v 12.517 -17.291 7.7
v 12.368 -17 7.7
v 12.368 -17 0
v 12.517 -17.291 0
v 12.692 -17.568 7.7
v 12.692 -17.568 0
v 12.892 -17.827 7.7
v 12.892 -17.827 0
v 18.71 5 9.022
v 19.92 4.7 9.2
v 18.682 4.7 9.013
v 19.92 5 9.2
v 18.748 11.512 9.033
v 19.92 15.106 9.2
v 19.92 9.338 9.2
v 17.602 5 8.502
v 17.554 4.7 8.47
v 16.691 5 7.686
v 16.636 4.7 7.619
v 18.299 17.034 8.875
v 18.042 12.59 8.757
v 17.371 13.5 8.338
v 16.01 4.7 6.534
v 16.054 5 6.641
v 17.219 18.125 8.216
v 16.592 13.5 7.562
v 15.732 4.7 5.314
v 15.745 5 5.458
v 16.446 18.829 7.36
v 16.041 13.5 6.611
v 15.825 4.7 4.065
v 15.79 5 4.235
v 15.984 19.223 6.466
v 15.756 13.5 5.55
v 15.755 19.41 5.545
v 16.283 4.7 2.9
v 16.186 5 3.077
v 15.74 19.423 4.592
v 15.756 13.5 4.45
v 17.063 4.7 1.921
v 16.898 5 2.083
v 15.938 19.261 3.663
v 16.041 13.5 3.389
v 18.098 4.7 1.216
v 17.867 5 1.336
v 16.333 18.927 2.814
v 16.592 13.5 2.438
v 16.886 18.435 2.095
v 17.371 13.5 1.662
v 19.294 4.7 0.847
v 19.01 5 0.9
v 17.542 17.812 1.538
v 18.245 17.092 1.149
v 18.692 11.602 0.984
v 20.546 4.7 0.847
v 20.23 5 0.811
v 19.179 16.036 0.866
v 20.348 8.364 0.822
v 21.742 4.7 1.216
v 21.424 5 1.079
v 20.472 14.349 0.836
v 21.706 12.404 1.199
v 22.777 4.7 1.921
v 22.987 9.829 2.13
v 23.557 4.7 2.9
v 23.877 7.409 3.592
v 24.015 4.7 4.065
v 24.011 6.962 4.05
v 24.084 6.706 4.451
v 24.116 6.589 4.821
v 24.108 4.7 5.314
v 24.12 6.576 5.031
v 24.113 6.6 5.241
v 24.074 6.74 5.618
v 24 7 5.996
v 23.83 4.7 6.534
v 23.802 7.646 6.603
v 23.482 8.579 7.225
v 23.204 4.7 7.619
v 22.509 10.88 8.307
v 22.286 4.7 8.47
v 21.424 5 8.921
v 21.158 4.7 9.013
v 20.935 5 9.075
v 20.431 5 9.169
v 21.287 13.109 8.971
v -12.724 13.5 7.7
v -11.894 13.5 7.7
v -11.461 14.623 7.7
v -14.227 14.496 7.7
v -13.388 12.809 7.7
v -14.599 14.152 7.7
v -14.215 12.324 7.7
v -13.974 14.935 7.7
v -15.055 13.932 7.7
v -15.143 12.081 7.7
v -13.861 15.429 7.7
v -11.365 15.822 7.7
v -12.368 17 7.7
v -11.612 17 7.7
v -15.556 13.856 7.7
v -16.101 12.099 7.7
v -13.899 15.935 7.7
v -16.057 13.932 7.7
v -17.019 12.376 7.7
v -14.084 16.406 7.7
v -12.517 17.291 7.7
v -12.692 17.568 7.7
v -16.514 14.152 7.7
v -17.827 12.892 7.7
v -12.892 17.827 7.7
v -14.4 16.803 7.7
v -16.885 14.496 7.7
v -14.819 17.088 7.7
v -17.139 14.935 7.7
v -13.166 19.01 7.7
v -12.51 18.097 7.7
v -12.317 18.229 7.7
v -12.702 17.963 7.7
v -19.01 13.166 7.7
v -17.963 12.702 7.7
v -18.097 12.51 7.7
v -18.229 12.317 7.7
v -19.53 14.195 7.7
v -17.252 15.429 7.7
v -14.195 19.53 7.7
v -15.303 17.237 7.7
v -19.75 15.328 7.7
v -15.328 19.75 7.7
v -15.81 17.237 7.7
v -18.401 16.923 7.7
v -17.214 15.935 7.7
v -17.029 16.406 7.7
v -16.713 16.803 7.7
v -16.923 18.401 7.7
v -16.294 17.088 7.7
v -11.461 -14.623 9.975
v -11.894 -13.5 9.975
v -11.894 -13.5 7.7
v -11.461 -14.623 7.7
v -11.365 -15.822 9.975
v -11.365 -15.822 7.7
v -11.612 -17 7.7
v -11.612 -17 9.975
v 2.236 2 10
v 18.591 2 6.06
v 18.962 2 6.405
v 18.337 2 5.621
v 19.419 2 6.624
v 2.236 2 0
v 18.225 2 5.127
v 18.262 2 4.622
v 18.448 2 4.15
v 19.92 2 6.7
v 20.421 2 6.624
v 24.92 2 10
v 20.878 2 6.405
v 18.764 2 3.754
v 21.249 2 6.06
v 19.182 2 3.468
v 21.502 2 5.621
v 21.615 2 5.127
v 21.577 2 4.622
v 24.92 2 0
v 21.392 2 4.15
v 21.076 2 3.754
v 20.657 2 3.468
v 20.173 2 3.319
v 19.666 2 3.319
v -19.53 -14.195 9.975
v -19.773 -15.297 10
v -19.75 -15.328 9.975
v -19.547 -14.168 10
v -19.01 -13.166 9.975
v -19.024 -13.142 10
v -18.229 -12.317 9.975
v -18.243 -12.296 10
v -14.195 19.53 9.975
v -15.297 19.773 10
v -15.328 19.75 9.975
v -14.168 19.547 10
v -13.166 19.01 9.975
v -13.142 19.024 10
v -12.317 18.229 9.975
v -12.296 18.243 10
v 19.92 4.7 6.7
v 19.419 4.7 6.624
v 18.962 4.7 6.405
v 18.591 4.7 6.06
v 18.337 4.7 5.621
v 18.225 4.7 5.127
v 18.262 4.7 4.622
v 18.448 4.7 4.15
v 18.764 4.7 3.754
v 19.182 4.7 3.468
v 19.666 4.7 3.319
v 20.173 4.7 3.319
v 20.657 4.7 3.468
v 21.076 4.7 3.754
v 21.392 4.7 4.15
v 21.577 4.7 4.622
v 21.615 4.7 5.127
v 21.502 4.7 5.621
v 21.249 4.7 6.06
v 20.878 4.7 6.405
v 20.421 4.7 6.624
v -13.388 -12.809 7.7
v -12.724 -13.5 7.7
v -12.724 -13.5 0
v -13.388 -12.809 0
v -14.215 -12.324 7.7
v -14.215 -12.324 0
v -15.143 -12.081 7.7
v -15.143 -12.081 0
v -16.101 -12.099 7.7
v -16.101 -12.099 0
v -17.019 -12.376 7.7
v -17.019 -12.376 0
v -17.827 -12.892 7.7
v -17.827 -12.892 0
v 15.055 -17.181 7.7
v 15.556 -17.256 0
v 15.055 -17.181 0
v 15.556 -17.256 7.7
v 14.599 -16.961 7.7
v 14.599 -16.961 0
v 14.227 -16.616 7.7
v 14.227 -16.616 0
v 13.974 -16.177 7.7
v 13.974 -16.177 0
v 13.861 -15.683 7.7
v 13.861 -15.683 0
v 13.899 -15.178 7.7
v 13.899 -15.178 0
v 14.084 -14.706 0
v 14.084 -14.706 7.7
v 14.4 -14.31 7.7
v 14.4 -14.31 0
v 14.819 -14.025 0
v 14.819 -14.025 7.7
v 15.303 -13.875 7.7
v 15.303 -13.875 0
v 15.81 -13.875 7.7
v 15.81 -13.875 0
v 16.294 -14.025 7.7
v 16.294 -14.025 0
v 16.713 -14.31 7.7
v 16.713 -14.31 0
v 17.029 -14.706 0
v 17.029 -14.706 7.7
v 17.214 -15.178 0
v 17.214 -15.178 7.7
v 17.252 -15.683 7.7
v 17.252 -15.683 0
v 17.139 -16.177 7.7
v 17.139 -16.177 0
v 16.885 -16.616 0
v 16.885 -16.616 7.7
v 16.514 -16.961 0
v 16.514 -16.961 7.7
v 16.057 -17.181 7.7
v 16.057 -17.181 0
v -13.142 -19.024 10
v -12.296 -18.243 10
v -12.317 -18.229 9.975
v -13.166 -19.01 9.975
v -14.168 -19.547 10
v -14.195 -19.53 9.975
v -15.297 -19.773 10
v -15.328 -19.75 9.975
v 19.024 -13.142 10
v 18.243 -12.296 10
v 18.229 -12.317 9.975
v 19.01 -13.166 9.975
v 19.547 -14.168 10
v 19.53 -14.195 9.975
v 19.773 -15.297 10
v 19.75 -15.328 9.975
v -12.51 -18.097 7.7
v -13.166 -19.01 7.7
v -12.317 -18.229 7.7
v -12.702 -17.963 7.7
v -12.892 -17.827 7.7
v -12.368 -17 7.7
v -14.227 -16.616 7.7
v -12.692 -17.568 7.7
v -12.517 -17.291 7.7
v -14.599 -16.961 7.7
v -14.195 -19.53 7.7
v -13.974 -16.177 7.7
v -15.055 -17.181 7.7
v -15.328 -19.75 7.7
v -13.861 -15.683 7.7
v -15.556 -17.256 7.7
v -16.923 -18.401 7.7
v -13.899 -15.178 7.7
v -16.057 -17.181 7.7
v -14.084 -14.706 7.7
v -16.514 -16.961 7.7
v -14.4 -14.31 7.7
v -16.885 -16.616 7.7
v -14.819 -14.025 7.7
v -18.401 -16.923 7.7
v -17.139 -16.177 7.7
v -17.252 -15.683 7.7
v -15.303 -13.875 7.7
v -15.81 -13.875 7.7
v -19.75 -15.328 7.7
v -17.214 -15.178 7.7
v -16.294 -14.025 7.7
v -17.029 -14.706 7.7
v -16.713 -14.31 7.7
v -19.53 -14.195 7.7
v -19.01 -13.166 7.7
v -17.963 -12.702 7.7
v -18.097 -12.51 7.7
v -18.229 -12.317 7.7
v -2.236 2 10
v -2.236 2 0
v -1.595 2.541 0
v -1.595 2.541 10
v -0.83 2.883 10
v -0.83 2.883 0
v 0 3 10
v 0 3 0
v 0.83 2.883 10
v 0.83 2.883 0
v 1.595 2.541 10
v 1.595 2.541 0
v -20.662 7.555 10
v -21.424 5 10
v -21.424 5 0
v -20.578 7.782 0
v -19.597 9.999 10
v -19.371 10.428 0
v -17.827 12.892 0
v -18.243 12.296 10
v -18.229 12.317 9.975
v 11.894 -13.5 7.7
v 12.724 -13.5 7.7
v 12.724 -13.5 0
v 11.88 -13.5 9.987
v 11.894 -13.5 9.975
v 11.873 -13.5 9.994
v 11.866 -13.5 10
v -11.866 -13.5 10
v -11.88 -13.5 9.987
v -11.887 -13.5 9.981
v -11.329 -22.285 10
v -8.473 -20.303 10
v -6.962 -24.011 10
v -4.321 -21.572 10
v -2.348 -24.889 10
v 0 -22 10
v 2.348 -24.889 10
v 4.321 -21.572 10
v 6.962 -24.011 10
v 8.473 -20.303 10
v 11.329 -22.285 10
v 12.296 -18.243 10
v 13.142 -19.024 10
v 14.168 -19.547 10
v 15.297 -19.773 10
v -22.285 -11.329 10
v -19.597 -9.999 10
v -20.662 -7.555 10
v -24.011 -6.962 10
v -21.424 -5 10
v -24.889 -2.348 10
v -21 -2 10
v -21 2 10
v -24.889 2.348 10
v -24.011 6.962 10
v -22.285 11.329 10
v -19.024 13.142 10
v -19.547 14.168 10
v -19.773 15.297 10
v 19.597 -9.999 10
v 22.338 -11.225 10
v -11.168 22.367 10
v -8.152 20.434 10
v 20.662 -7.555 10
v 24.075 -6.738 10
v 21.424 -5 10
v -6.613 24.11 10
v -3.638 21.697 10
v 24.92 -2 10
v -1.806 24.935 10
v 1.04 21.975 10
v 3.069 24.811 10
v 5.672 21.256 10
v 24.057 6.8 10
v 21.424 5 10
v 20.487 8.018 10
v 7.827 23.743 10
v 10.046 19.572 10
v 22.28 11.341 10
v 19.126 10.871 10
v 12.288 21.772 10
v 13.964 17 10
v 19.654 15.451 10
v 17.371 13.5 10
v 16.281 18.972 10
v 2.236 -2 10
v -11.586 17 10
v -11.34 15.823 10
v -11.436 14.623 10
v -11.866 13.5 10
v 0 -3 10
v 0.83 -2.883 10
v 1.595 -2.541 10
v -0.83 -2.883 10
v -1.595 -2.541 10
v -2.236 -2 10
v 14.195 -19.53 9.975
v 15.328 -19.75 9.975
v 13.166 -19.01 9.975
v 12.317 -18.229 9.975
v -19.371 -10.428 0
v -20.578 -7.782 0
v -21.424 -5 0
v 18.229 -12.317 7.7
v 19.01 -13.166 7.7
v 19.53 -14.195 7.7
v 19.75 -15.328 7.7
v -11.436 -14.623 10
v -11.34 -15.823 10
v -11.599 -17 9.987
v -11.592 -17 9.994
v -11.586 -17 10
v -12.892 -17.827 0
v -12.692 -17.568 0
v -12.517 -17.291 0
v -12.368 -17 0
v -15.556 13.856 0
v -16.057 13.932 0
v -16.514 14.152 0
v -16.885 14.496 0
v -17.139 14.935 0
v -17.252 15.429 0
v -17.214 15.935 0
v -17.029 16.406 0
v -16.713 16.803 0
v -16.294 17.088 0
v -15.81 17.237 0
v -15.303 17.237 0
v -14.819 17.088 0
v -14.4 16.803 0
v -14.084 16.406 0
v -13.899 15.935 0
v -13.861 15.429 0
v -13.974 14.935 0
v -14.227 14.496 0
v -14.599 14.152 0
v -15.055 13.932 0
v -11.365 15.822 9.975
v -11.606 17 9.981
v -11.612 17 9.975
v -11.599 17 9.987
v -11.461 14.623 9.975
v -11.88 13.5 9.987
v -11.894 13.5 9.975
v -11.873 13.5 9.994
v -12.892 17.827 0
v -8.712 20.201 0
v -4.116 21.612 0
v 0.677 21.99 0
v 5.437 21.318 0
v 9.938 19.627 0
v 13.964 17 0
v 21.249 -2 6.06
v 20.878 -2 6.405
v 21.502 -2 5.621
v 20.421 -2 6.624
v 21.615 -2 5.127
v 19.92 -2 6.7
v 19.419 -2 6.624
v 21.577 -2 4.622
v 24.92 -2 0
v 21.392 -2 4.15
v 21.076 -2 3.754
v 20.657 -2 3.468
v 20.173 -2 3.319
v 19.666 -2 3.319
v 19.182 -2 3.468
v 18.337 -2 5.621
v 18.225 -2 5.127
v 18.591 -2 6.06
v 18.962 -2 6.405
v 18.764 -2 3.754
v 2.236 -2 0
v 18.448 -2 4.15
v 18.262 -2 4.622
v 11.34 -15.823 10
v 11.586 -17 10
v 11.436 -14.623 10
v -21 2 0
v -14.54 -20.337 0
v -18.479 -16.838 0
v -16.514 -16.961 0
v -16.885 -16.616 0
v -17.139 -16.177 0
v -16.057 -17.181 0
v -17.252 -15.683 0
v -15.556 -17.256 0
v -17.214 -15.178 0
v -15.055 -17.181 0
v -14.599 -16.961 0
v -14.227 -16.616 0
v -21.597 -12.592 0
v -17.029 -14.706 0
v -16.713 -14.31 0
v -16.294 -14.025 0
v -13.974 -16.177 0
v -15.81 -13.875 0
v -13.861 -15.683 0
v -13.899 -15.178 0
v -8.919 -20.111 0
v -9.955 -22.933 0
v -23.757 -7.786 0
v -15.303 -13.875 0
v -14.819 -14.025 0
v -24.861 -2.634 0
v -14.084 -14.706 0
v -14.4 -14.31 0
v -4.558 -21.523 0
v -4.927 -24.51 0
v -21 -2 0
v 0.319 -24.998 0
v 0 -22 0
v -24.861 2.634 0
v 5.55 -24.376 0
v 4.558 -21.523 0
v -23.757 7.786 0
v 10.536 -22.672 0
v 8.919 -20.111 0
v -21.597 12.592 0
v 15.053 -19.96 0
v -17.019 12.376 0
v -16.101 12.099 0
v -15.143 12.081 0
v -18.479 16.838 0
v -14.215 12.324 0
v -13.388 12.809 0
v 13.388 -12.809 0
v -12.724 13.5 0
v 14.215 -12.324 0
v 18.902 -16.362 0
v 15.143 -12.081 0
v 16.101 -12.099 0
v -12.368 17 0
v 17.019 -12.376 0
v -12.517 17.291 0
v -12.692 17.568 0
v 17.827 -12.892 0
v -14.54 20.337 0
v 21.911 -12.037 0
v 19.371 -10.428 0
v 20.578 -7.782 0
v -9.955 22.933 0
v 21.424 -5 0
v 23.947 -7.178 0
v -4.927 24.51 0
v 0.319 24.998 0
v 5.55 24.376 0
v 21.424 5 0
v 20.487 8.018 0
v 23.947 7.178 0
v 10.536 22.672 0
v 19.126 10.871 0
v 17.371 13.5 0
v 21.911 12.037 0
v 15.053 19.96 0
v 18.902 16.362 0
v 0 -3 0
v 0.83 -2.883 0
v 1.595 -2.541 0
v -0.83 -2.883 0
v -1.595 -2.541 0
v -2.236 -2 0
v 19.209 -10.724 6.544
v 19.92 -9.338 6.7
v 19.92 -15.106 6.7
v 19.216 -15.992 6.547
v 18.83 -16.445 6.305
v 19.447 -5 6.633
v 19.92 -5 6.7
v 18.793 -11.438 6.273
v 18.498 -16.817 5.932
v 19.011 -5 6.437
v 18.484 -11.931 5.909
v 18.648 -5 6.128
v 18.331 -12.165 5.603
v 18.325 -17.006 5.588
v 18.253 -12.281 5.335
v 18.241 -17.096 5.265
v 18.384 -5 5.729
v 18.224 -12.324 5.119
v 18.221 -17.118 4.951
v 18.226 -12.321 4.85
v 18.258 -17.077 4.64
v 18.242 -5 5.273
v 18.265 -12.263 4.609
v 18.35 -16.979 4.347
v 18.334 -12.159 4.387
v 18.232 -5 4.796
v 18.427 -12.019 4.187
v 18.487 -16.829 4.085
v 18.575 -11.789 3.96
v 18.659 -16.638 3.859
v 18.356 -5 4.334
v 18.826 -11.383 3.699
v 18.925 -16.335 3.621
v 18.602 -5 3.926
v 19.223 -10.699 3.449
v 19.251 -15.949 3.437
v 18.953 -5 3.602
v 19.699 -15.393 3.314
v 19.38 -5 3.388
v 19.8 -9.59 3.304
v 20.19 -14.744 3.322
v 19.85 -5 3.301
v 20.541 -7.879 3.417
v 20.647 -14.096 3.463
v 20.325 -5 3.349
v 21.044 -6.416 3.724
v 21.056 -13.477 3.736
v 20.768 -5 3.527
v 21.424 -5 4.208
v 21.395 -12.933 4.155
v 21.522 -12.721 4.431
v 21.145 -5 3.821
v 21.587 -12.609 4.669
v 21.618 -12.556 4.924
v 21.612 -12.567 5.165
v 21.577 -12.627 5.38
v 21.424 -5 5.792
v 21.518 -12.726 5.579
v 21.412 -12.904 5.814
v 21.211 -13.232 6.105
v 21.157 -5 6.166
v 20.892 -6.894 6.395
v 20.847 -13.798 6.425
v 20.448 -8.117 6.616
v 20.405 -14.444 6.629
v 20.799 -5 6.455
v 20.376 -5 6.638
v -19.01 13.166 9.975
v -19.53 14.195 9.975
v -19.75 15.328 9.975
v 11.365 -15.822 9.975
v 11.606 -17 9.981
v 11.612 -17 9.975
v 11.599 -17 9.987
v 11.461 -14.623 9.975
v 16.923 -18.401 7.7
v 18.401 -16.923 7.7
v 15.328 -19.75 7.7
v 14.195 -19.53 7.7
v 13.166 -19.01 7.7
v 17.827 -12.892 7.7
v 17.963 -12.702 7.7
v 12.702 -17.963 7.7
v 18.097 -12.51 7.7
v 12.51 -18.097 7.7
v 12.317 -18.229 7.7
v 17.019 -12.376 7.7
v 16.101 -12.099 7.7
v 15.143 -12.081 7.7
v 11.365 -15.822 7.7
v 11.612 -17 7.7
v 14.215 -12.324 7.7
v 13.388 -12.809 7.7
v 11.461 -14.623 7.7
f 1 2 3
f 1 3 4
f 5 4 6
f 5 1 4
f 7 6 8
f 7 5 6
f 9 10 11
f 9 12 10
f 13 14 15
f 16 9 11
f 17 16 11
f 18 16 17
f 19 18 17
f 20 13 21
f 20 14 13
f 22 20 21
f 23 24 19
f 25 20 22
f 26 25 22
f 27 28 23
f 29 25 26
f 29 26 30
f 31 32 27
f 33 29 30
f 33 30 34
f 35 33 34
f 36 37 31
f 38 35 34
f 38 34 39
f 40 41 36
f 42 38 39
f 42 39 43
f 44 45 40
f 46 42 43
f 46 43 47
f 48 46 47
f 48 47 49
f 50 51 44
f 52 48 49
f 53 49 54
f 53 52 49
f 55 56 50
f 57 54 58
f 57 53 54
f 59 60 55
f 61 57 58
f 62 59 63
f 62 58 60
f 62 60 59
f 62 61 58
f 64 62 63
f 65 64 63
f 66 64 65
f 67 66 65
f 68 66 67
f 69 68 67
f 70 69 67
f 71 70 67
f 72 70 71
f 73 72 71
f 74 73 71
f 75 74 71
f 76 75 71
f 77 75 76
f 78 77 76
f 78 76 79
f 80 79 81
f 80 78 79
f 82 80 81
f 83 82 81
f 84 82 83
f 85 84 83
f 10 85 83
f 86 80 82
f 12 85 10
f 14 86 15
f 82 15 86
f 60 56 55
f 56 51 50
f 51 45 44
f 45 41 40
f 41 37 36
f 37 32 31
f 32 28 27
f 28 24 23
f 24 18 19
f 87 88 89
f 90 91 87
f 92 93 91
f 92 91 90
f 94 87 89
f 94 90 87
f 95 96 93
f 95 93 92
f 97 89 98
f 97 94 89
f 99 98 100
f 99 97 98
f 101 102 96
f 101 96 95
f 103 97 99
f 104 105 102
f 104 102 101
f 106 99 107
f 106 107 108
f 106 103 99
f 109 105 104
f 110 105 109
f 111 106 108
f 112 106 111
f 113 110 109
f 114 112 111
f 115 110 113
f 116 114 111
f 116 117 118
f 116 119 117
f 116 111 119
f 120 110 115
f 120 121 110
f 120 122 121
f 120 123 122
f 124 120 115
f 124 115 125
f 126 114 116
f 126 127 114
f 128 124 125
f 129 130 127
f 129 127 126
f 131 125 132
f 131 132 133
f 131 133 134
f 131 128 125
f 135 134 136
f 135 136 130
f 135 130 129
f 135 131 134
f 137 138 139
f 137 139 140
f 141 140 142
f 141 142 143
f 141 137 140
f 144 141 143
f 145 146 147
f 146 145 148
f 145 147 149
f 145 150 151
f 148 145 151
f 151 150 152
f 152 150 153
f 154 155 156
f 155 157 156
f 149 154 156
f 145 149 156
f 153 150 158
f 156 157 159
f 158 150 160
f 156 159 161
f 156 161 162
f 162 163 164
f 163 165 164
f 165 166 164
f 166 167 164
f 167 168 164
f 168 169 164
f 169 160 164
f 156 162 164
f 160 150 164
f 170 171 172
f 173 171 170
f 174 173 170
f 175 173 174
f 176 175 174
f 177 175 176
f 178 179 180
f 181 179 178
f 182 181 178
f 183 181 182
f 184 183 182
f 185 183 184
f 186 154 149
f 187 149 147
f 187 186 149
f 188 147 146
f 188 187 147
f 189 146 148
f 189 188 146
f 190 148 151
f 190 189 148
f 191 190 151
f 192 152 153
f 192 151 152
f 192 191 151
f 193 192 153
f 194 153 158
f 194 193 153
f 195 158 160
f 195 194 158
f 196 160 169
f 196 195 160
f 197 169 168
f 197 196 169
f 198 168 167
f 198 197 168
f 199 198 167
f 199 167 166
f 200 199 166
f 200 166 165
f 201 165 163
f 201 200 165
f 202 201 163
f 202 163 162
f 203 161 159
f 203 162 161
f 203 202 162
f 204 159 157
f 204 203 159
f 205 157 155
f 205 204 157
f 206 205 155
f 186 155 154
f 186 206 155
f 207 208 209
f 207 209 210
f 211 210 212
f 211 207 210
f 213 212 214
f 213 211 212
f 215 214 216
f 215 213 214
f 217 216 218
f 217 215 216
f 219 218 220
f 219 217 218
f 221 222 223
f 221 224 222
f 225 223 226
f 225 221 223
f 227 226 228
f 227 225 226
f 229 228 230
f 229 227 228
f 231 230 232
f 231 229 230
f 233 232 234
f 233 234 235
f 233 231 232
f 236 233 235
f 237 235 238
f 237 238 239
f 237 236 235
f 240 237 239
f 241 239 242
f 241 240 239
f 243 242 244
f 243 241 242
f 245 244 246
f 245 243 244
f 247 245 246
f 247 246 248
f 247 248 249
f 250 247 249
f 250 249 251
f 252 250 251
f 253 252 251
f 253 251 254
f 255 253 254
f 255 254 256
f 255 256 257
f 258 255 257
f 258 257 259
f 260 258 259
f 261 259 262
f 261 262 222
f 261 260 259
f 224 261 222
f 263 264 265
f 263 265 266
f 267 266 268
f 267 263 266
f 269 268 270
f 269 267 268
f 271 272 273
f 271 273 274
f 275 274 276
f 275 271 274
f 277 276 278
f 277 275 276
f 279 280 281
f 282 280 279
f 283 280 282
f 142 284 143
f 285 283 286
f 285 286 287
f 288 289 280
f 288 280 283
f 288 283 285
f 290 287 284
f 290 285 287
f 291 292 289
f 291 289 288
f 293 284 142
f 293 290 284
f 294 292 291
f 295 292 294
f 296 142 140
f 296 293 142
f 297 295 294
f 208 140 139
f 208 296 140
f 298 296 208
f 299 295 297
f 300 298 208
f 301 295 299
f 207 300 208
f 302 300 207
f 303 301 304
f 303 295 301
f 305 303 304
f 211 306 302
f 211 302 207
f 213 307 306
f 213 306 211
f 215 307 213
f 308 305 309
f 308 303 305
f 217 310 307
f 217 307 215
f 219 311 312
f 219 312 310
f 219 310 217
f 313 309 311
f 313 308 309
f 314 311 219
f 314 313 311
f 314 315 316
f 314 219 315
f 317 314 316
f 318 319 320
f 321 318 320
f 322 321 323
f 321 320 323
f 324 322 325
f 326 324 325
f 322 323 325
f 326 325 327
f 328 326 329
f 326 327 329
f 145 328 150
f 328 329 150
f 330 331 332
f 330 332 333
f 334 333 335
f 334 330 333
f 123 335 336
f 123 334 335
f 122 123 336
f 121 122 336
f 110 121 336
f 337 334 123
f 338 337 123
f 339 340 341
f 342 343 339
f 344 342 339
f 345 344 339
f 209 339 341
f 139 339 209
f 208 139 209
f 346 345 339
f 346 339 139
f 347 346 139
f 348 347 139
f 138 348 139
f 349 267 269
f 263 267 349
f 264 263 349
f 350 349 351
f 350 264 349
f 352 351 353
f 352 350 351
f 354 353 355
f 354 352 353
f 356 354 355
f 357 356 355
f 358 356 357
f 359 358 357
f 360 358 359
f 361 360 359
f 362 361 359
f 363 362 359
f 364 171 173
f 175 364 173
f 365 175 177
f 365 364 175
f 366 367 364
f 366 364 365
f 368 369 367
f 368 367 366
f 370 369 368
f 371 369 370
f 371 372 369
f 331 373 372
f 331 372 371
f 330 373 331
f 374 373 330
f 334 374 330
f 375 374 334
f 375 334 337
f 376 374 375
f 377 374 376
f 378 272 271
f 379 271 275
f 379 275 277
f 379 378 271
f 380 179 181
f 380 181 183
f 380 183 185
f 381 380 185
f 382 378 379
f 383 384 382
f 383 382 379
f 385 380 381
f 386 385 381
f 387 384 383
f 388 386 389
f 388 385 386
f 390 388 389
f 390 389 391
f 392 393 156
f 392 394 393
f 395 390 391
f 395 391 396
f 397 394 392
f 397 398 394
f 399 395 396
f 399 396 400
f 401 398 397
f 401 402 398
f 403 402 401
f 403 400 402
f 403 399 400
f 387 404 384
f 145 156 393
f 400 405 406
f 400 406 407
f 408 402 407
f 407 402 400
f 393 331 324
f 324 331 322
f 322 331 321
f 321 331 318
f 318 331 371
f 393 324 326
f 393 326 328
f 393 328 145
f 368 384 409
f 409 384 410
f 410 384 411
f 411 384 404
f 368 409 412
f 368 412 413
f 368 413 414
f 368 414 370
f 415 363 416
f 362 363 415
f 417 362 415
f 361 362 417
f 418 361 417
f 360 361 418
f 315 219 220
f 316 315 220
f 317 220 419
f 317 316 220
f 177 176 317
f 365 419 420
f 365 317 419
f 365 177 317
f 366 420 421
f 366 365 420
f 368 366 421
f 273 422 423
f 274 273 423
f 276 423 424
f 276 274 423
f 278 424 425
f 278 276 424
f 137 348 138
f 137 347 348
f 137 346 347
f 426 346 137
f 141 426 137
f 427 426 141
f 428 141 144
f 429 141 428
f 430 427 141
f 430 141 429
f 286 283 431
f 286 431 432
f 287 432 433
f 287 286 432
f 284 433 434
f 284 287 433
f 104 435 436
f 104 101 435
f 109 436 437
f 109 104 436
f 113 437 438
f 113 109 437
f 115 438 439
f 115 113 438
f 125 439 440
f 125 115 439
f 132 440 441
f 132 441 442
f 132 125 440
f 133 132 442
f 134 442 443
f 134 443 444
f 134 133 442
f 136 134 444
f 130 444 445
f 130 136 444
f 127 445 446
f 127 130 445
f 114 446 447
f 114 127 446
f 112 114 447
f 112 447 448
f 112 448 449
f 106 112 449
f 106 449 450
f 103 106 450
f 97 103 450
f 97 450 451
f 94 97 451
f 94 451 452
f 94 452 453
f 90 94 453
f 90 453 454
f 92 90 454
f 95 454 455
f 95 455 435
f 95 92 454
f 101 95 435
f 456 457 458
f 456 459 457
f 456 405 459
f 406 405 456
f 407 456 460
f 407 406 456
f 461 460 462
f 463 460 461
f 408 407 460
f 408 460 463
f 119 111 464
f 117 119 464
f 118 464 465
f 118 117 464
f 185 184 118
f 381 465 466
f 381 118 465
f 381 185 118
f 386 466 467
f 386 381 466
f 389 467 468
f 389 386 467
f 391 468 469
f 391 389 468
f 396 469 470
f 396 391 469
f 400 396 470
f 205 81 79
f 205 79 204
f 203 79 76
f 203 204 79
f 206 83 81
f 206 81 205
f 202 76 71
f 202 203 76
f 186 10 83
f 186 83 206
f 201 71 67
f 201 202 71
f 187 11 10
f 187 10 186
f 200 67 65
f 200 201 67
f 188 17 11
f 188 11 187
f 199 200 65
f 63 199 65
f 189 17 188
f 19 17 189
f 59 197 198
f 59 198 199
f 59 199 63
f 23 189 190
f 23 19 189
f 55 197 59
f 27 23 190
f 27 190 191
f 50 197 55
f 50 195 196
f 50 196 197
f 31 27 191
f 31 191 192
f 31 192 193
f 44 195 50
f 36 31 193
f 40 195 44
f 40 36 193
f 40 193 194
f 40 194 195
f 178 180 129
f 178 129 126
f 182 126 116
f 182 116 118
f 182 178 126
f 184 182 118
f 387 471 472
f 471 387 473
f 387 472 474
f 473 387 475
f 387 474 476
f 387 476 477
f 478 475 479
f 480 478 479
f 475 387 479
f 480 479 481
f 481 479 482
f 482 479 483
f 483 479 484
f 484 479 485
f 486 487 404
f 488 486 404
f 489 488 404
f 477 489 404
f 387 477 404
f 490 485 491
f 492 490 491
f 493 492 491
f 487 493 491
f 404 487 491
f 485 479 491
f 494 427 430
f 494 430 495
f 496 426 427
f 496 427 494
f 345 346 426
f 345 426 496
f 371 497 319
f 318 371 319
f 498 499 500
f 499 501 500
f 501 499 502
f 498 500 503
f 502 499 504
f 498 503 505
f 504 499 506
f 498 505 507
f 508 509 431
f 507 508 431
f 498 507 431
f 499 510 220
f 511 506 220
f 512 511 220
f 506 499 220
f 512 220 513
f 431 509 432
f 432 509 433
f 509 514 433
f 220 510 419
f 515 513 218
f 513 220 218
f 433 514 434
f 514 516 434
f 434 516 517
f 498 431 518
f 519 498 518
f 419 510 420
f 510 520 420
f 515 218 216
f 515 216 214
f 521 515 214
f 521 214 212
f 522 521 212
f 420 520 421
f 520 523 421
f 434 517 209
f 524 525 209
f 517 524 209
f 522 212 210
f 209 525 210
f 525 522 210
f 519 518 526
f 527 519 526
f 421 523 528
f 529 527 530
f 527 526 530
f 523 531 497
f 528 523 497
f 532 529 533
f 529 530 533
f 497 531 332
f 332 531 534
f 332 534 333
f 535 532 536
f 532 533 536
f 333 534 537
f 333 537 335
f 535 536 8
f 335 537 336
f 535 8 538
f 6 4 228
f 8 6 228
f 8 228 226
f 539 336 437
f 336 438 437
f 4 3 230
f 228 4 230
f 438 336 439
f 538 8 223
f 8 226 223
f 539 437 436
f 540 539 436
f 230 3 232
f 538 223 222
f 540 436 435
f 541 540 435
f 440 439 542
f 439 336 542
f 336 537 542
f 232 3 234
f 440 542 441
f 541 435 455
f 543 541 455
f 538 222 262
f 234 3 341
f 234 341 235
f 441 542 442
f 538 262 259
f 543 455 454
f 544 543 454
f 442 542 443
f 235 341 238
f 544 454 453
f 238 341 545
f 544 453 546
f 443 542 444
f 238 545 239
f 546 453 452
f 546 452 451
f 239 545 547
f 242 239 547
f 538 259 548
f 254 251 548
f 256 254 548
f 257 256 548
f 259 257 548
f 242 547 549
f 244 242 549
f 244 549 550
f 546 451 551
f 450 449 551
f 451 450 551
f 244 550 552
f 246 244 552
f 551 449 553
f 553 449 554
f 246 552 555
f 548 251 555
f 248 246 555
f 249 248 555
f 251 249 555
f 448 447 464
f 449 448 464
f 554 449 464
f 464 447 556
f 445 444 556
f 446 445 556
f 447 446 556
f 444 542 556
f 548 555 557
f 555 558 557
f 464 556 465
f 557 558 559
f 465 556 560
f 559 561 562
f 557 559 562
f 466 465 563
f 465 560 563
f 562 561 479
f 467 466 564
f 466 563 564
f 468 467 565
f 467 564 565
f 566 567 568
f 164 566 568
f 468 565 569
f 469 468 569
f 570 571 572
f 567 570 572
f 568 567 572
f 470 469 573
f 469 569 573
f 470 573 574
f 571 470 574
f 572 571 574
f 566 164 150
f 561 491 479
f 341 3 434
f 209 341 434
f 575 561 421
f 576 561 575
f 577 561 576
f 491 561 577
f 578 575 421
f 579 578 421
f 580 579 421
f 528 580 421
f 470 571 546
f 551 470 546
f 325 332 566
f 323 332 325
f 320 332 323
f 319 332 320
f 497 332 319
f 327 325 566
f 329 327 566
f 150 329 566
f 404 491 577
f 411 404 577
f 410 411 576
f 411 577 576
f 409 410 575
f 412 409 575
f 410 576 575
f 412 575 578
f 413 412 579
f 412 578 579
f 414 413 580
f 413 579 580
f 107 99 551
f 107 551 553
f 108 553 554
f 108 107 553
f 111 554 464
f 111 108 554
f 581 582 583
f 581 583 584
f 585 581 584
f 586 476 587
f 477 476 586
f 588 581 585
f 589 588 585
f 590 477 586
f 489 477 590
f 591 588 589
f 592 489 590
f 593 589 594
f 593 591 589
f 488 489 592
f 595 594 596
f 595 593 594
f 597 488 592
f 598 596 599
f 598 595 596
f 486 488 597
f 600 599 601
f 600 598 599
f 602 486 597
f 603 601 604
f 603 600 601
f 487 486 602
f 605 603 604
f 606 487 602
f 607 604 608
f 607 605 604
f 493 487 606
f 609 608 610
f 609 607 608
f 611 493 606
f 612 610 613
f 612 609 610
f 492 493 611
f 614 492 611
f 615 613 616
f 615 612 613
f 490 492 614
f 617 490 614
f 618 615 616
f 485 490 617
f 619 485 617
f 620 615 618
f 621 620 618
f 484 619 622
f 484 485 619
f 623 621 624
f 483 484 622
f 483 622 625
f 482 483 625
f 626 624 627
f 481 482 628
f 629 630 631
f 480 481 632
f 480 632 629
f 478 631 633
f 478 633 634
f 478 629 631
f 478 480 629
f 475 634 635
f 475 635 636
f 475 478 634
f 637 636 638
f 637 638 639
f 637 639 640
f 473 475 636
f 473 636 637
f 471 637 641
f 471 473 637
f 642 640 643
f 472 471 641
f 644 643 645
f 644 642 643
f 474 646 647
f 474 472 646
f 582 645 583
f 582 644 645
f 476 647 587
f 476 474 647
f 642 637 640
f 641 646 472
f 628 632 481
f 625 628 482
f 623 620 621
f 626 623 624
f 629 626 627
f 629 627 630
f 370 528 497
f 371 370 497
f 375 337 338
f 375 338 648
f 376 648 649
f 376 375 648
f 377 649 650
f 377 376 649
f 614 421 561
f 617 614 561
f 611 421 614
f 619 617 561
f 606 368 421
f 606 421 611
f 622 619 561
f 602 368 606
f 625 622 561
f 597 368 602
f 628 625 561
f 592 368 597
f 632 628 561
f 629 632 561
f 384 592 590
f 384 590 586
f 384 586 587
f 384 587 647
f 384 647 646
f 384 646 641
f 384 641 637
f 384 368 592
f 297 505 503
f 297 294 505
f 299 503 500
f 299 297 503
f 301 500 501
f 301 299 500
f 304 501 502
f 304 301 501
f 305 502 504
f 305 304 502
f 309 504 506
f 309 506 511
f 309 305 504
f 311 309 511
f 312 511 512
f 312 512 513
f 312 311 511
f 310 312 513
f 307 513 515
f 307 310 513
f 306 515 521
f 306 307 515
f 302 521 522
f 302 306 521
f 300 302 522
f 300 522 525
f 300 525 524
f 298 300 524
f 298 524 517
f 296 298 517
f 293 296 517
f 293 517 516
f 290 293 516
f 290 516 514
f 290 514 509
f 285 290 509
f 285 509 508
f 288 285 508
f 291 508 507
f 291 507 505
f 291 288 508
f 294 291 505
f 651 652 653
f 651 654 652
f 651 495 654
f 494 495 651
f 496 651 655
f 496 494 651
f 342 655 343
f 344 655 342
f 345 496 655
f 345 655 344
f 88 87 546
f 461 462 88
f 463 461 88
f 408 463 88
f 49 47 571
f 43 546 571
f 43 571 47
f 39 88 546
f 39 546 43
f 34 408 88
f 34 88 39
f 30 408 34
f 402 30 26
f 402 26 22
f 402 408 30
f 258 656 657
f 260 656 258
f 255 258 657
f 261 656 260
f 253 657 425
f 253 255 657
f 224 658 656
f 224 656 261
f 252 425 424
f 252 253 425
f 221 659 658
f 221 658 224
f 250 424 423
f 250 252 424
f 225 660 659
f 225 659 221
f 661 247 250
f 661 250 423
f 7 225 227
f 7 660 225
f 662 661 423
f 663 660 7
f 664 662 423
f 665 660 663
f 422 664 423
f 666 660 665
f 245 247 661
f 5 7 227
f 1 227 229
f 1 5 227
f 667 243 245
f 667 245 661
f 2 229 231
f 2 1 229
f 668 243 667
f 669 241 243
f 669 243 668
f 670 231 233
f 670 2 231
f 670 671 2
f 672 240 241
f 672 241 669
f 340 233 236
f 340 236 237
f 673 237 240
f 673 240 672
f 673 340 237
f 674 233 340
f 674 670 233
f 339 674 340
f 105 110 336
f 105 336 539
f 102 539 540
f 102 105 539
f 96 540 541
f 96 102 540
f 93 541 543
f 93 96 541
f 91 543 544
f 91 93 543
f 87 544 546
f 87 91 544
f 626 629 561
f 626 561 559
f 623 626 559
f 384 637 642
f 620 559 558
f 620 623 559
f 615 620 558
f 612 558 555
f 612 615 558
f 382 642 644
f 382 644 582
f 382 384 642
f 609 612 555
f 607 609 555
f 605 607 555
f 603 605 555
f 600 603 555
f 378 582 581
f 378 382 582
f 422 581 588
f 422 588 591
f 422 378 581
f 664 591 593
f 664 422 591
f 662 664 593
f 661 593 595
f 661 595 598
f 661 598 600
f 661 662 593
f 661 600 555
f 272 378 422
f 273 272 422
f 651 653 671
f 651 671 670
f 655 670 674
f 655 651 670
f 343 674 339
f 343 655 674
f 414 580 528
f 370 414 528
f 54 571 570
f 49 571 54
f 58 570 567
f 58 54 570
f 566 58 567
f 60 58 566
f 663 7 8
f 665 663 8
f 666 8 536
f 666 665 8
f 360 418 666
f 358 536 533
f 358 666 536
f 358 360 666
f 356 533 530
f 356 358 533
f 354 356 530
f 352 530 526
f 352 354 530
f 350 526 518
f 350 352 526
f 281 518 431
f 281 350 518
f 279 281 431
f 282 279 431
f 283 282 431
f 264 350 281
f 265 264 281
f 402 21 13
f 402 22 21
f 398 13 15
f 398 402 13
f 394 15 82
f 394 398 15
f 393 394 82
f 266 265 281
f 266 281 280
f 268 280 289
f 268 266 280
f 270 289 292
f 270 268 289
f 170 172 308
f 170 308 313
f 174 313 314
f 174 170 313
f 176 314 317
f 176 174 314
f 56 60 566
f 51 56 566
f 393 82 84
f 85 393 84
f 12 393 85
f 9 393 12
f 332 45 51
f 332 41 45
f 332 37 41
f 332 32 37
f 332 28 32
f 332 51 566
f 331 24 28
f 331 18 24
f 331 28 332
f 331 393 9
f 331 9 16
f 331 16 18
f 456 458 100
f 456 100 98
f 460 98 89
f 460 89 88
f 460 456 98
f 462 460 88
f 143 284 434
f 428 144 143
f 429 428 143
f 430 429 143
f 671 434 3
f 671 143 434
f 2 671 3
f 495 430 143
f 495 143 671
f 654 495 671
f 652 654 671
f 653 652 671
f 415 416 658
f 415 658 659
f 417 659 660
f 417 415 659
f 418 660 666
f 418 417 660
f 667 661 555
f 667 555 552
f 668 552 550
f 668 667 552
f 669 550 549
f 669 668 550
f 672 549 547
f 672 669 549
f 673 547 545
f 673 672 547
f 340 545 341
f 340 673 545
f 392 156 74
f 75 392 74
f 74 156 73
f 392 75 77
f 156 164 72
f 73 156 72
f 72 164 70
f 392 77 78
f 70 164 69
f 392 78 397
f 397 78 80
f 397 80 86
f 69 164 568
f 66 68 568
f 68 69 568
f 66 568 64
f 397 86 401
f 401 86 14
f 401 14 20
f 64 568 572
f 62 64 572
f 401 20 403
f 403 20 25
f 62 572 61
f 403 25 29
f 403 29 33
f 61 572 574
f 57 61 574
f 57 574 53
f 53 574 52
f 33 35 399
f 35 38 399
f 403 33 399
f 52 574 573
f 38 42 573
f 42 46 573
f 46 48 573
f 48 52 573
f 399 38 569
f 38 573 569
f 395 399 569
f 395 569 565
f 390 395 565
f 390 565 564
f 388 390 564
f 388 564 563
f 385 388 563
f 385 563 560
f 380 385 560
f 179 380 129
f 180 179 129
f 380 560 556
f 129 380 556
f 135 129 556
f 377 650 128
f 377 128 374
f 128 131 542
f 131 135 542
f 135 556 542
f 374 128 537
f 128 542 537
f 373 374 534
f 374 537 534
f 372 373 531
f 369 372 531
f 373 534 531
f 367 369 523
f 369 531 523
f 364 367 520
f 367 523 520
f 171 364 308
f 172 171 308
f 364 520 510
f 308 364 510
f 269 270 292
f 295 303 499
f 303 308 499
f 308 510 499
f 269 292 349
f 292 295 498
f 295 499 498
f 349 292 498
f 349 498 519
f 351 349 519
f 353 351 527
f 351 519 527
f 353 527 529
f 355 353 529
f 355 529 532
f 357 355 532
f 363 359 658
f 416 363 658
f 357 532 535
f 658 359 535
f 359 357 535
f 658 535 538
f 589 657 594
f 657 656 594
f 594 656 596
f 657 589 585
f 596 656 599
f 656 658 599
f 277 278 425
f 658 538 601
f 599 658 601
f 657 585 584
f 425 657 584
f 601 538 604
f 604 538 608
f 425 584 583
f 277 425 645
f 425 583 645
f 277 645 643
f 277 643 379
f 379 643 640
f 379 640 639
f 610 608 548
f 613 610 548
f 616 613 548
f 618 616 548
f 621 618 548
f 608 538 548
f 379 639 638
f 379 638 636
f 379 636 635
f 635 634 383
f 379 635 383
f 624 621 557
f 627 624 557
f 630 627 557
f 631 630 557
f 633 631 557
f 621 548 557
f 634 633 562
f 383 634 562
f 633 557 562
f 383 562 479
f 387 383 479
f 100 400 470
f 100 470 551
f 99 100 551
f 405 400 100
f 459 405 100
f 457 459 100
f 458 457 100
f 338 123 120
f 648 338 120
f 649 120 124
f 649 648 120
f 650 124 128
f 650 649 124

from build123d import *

# Parameters (mm, degrees)
BOSS_EXTRUDE1_DEPTH                           = 10
CBORE_FOR_M3_HEX_HEAD_MACHINE_SCREW3_AT_COUNT = 2
CBORE_FOR_M3_HEX_HEAD_MACHINE_SCREW3_AT_PITCH = 31.112698372
CBORE_FOR_M3_HEX_HEAD_MACHINE_SCREW3_2_COUNT  = 2
CBORE_FOR_M3_HEX_HEAD_MACHINE_SCREW3_2_PITCH  = 44
CUT_EXTRUDE1_START                            = -10
CUT_EXTRUDE1_DEPTH                            = 10


with BuildPart() as part:
    # Sketch1 → Boss-Extrude1 (new body)
    with BuildSketch(Plane.XY):
        with BuildLine():
            Line((-2.236067977, -2), (-21, -2))
            Line((-21, -2), (-21, 2))
            Line((-21, 2), (-2.236067977, 2))
            ThreePointArc((-2.236067977, 2), (0, 3), (2.236067977, 2))
            Line((2.236067977, 2), (24.919871589, 2))
            ThreePointArc((24.919871589, 2), (-25, 0), (24.919871589, -2))
            Line((24.919871589, -2), (2.236067977, -2))
            ThreePointArc((2.236067977, -2), (0, -3), (-2.236067977, -2))
        make_face()
    extrude(amount=BOSS_EXTRUDE1_DEPTH)

    # Sketch6 → CBORE for M3 Hex Head Machine Screw2 (revolve, cut)
    with BuildSketch(Plane(origin=(19.919871589, 22, 5), x_dir=(0, 0, 1), z_dir=(1, 0, 0))):
        Polygon((0, 0), (0, 47), (1.7, 47), (1.7, 17.3), (4.2, 17.3), (4.2, 0.025), (4.225, 0), align=None)
    revolve(axis=Axis((19.919871589, 28.35, 5), (0, -1, 0)), mode=Mode.SUBTRACT)

    # Sketch8 → CBORE for M3 Hex Head Machine Screw3 (revolve, cut)
    with BuildSketch(Plane(origin=(-15.556349186, 15.556349186, 10), x_dir=(0, -1, 0), z_dir=(1, 0, 0))):
        Polygon((0, 0), (0, 10), (1.7, 10), (1.7, 2.3), (4.2, 2.3), (4.2, 0.025), (4.225, 0), align=None)
    cbore_for_m3_hex_head_machine_screw3 = revolve(axis=Axis((-15.556349186, 15.556349186, 16.35), (0, 0, -1)), mode=Mode.SUBTRACT)

    # CBORE for M3 Hex Head Machine Screw3 at: CBORE for M3 Hex Head Machine Screw3 ×2
    with Locations(*[(0, -i * CBORE_FOR_M3_HEX_HEAD_MACHINE_SCREW3_AT_PITCH, 0) for i in range(1, CBORE_FOR_M3_HEX_HEAD_MACHINE_SCREW3_AT_COUNT)]):
        add(cbore_for_m3_hex_head_machine_screw3, mode=Mode.SUBTRACT)

    # CBORE for M3 Hex Head Machine Screw3 2: CBORE for M3 Hex Head Machine Screw3 ×2
    with Locations(*[Vector(0.707106781, -0.707106781, 0) * (i * CBORE_FOR_M3_HEX_HEAD_MACHINE_SCREW3_2_PITCH) for i in range(1, CBORE_FOR_M3_HEX_HEAD_MACHINE_SCREW3_2_COUNT)]):
        add(cbore_for_m3_hex_head_machine_screw3, mode=Mode.SUBTRACT)

    # Sketch9 → Cut-Extrude1 (cut)
    with BuildSketch(Plane(origin=(0, 0, 0), x_dir=(-1, 0, 0), z_dir=(0, 0, -1)).offset(CUT_EXTRUDE1_START)):
        with BuildLine():
            ThreePointArc((-17.370952766, 13.5), (-19.8577472, 9.46941794), (-21.424285286, 5))
            Line((-21.424285286, 5), (21.424285286, 5))
            ThreePointArc((21.424285286, 5), (20.018217875, 9.125291947), (17.826515683, 12.892452777))
            ThreePointArc((17.826515683, 12.892452777), (15.142522709, 12.080899913), (12.724136619, 13.5))
            Line((12.724136619, 13.5), (-17.370952766, 13.5))
        make_face()
        with BuildLine():
            Line((21.424285286, -5), (-21.424285286, -5))
            ThreePointArc((-21.424285286, -5), (-20.018217875, -9.125291947), (-17.826515683, -12.892452777))
            ThreePointArc((-17.826515683, -12.892452777), (-15.142522709, -12.080899913), (-12.724136619, -13.5))
            Line((-12.724136619, -13.5), (12.724136619, -13.5))
            ThreePointArc((12.724136619, -13.5), (15.142522709, -12.080899913), (17.826515683, -12.892452777))
            ThreePointArc((17.826515683, -12.892452777), (20.018217875, -9.125291947), (21.424285286, -5))
        make_face()
        with BuildLine():
            ThreePointArc((12.892452777, 17.826515683), (-0.676730397, 21.989589263), (-13.964240044, 17))
            Line((-13.964240044, 17), (12.367952673, 17))
            ThreePointArc((12.367952673, 17), (12.601164732, 17.431685114), (12.892452777, 17.826515683))
        make_face()
        with BuildLine():
            ThreePointArc((-12.367952673, -17), (-12.601164732, -17.431685114), (-12.892452777, -17.826515683))
            ThreePointArc((-12.892452777, -17.826515683), (0, -22), (12.892452777, -17.826515683))
            ThreePointArc((12.892452777, -17.826515683), (12.601164732, -17.431685114), (12.367952673, -17))
            Line((12.367952673, -17), (-12.367952673, -17))
        make_face()
    extrude(amount=CUT_EXTRUDE1_DEPTH, mode=Mode.SUBTRACT)


solid = part.part
